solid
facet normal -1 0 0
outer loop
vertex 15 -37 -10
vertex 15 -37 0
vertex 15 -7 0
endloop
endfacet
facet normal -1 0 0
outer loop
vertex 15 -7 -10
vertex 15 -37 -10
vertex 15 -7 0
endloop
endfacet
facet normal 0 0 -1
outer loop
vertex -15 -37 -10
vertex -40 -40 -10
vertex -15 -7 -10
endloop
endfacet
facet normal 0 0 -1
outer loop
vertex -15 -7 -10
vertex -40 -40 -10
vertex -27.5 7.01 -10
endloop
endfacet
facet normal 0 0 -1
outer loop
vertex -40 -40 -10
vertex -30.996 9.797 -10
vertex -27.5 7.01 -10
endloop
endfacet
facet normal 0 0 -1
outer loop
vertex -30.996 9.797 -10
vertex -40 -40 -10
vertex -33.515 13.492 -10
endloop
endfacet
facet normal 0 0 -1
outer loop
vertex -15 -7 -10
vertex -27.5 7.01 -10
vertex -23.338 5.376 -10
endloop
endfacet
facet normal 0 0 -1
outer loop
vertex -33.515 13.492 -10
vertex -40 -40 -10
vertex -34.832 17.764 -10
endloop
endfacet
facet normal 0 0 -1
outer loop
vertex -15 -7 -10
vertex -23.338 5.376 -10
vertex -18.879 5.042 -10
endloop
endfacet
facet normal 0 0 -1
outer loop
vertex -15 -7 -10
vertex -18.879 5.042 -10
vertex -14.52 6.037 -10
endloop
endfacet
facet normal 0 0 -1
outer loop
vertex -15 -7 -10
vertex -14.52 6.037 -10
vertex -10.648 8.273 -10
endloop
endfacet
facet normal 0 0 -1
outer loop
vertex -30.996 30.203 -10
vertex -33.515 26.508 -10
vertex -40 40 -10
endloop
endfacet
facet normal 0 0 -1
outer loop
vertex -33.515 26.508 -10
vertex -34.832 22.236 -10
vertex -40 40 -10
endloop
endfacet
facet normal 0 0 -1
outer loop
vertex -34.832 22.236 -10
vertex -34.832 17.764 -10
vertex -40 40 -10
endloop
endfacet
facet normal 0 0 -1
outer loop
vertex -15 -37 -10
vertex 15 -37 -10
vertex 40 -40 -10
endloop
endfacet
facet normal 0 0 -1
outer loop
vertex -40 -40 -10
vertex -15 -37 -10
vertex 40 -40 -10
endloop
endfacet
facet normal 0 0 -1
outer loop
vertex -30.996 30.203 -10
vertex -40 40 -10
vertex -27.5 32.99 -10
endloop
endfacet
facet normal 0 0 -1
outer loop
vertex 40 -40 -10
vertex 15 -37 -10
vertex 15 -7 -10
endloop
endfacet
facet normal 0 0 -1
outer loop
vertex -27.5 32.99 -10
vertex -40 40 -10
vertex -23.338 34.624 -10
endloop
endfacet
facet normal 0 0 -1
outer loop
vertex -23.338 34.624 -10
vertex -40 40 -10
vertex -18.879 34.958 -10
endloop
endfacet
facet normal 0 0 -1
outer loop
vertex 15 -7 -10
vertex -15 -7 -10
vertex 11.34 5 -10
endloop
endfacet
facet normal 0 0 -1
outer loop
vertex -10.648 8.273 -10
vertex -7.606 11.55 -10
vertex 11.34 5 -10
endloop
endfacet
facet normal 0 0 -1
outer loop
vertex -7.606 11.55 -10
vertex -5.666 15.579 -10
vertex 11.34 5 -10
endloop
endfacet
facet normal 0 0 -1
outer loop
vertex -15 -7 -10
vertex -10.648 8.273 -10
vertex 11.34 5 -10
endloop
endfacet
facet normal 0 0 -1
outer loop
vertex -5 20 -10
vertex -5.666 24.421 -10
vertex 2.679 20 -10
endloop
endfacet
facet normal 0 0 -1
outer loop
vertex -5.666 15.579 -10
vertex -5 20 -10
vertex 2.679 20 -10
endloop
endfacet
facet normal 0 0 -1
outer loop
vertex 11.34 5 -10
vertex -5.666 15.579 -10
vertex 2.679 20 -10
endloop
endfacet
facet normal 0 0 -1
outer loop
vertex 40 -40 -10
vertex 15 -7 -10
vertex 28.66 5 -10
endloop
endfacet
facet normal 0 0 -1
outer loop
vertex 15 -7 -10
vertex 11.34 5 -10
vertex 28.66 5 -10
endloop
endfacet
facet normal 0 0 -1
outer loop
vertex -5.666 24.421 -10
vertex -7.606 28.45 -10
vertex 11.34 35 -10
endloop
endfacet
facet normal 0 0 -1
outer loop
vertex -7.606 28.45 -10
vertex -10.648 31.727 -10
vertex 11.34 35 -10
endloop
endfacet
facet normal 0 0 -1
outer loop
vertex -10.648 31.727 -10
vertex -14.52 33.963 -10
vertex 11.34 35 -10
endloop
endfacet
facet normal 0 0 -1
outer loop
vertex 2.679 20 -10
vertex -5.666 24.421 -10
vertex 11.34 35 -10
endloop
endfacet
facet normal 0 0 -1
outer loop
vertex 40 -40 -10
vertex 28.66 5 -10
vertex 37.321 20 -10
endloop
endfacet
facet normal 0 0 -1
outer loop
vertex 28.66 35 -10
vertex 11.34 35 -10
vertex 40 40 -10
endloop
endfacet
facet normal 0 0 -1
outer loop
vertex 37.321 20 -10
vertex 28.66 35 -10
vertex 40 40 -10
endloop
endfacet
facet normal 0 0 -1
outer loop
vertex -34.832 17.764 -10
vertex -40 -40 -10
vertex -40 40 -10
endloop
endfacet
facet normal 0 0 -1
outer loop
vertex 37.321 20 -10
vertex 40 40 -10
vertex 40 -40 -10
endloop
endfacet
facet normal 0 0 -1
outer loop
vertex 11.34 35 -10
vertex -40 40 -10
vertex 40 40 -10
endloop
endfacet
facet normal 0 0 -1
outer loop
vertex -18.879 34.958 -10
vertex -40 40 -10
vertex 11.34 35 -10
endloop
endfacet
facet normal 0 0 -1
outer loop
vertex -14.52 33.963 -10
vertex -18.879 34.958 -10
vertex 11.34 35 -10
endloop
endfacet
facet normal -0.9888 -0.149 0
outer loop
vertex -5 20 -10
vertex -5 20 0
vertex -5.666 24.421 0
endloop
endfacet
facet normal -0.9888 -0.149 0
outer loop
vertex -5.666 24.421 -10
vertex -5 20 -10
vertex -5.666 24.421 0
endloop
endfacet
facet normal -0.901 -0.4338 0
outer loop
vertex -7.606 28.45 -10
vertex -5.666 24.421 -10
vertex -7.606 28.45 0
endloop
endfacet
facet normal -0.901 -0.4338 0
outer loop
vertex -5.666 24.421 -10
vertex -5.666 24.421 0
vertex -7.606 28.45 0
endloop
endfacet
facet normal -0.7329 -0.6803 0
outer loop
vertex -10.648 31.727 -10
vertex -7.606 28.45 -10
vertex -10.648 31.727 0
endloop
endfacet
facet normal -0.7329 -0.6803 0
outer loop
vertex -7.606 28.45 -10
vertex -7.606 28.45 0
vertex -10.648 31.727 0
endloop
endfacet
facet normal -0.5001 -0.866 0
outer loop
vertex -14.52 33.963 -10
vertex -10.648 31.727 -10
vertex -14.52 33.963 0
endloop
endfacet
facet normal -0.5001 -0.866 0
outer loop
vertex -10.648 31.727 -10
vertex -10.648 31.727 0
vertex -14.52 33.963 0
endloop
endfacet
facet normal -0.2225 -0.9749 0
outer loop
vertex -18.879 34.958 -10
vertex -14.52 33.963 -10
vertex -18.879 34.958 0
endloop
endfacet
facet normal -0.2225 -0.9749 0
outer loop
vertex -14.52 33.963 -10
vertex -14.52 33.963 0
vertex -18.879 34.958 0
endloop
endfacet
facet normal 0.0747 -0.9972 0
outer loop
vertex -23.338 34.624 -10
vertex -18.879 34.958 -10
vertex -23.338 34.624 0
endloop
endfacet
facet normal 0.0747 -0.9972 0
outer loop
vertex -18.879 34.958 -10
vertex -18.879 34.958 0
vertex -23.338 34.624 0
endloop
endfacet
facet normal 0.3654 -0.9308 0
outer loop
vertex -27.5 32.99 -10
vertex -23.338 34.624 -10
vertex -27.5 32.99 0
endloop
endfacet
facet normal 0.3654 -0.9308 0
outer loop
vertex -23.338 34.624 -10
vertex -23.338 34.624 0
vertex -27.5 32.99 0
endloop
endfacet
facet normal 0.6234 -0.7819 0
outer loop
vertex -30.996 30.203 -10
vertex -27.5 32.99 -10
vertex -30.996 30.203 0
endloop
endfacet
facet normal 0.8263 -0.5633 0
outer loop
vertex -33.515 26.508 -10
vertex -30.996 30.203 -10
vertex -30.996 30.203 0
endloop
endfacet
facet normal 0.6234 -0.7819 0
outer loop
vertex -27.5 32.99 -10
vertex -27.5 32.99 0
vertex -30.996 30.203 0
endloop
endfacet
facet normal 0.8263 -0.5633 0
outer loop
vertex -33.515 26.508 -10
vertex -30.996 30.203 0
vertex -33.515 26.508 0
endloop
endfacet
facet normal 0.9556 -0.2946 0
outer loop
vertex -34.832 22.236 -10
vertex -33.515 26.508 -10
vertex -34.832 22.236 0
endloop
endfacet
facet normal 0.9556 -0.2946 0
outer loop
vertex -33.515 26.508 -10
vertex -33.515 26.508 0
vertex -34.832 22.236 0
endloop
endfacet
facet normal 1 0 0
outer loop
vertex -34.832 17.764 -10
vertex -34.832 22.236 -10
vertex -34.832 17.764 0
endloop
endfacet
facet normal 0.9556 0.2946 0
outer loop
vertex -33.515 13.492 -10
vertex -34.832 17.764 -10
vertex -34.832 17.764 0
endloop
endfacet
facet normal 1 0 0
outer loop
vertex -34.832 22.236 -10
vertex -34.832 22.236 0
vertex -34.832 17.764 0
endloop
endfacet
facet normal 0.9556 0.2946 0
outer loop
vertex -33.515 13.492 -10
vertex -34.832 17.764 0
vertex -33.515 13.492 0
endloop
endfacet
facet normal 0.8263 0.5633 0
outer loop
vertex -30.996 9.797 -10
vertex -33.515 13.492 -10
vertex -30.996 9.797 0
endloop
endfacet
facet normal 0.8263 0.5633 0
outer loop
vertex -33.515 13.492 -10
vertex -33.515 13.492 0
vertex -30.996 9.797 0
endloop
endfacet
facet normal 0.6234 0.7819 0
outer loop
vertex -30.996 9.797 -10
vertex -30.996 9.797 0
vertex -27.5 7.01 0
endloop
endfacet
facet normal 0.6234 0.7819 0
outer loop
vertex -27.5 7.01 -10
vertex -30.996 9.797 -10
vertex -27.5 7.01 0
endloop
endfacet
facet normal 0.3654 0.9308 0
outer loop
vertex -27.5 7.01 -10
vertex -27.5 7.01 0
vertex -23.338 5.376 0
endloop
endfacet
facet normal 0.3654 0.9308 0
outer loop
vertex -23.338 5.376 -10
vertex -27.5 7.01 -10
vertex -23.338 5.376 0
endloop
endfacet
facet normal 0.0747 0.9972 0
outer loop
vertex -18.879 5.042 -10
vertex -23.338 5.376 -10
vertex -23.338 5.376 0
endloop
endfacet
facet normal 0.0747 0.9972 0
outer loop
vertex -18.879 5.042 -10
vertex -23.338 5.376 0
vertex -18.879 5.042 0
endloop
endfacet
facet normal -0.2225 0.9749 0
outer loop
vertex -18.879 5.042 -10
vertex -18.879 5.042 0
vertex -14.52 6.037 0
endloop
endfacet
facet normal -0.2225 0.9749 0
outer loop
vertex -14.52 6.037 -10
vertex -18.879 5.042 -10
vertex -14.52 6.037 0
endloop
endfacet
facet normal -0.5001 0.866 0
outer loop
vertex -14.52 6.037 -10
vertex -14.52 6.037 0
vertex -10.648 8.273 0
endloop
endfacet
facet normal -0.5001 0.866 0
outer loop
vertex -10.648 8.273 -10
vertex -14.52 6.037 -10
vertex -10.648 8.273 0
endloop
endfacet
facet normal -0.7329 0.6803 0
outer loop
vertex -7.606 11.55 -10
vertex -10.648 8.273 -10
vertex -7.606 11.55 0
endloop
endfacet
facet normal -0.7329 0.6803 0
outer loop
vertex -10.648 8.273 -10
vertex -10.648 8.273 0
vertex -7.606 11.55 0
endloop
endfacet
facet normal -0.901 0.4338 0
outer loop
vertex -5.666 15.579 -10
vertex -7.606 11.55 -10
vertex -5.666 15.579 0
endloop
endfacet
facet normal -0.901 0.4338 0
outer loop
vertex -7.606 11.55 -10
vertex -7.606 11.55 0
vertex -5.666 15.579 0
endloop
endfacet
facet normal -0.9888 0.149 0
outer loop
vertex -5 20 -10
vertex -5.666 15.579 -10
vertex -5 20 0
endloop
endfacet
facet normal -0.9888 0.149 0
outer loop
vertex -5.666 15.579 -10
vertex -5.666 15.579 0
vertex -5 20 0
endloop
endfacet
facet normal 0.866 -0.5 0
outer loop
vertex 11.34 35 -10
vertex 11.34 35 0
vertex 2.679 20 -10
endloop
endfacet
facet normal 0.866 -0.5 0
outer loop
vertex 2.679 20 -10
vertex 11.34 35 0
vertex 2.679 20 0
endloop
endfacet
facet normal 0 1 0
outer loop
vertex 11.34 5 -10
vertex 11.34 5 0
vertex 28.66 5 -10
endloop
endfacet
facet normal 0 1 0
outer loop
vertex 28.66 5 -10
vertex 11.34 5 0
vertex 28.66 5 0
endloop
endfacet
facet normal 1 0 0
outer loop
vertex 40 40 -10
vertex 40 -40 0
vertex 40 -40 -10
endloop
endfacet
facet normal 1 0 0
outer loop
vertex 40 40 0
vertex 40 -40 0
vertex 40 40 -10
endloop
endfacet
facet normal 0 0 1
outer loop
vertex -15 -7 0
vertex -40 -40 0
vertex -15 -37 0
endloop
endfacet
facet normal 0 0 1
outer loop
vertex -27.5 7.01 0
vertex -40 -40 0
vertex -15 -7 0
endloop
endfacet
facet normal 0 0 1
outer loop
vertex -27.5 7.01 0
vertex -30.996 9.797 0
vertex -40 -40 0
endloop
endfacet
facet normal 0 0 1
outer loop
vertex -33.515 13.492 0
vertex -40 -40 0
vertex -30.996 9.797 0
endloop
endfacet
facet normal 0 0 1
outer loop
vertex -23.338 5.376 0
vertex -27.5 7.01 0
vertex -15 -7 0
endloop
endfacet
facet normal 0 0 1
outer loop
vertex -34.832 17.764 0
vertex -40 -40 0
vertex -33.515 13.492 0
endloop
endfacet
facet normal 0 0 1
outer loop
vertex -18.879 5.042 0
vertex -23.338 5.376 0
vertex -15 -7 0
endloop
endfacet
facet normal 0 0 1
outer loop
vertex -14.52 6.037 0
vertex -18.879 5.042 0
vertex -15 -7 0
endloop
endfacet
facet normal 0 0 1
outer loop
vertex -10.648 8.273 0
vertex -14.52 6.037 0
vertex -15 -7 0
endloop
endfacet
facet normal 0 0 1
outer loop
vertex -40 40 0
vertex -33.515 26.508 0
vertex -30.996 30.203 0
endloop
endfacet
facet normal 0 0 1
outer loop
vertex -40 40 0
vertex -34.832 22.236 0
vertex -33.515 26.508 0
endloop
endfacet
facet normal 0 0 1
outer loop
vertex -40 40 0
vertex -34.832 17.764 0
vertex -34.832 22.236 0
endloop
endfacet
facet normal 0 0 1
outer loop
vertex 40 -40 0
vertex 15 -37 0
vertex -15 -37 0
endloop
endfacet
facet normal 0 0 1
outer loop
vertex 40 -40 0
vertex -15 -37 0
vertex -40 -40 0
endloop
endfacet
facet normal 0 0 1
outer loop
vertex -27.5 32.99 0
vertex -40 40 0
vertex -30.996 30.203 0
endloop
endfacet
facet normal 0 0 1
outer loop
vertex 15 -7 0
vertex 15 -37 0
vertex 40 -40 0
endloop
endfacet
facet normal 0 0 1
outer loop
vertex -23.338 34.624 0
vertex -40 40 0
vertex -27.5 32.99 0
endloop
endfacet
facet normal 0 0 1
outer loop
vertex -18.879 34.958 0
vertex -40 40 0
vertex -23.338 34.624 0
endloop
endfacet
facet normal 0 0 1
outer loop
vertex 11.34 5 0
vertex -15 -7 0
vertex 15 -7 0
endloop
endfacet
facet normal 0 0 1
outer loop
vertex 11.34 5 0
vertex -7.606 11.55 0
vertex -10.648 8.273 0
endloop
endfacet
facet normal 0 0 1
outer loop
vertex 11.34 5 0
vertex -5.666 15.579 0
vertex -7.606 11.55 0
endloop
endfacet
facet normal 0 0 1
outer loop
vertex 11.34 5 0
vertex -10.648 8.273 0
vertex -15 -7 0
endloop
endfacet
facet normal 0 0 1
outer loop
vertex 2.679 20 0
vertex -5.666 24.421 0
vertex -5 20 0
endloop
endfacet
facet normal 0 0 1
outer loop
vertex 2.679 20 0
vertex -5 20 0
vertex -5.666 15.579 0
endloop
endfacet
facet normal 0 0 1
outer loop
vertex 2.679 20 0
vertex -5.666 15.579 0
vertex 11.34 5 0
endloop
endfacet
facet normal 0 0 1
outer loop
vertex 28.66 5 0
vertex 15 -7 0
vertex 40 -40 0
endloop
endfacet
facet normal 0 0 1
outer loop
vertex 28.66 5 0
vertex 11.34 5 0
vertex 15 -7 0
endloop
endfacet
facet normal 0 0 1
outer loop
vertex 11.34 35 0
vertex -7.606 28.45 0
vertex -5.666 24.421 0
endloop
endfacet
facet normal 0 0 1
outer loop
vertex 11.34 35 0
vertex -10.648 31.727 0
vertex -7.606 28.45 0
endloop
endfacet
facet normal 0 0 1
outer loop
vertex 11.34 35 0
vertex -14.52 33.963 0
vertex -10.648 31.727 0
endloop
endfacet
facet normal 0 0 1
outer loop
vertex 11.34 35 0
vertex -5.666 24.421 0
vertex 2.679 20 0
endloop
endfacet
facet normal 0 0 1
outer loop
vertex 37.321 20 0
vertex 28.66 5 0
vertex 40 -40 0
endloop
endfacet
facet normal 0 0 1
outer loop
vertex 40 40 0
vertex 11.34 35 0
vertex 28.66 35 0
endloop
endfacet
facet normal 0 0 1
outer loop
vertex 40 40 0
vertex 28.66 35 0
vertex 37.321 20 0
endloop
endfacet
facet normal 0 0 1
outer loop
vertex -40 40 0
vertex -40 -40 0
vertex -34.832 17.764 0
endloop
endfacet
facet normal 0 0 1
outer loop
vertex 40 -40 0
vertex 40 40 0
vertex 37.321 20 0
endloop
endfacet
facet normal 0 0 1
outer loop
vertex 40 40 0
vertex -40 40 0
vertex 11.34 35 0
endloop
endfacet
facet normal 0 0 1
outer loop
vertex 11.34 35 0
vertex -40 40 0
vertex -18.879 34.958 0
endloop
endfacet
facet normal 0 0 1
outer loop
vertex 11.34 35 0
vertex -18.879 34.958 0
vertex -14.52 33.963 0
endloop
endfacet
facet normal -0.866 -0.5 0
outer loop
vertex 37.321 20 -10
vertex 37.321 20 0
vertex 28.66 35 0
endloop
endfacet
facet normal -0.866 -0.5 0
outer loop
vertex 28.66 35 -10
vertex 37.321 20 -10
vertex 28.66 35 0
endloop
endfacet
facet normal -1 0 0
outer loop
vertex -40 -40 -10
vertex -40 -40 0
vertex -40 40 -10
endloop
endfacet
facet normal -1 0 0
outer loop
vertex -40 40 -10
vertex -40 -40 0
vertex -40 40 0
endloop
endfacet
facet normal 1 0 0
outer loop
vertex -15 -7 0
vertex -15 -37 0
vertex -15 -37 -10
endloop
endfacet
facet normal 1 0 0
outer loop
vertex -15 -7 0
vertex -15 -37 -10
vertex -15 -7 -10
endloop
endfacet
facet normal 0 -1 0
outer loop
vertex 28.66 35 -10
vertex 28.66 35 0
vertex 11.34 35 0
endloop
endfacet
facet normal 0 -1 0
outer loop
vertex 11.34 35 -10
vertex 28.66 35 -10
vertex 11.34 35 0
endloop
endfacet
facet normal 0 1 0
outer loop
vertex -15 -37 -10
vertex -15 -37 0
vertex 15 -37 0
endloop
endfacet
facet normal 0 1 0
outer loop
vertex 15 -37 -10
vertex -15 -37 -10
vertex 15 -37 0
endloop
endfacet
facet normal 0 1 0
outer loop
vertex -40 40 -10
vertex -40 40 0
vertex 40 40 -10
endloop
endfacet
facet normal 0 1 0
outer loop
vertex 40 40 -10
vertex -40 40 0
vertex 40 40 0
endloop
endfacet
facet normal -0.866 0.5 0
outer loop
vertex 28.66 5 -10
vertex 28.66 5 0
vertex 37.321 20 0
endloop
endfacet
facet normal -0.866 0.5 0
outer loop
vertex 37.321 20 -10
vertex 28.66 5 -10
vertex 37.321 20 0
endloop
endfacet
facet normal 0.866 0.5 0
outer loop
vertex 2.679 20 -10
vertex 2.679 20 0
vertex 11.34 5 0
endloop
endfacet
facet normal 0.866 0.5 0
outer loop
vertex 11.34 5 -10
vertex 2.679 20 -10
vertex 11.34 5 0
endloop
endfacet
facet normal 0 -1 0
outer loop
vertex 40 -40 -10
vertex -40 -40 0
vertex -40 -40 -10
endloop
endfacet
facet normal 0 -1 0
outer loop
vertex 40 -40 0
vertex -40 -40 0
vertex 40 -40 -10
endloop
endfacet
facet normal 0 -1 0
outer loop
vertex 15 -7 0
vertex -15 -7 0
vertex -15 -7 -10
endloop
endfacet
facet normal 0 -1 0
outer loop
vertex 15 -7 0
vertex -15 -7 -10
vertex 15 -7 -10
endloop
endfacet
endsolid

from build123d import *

# Parameters (mm, degrees)
SKETCH1_W           = 80
SKETCH1_H           = 80
SKETCH1_R           = 15
SKETCH1_W_2         = 30
SKETCH1_H_2         = 30
BOSS_EXTRUDE1_DEPTH = 10


with BuildPart() as part:
    # Sketch1 → Boss-Extrude1 (new body)
    with BuildSketch(Plane.XY):
        Rectangle(SKETCH1_W, SKETCH1_H)
        with Locations((-20, 20)):
            Circle(SKETCH1_R, mode=Mode.SUBTRACT)
        Polygon((11.339745962, 35), (2.679491924, 20), (11.339745962, 5), (28.660254038, 5), (37.320508076, 20), (28.660254038, 35), align=None, mode=Mode.SUBTRACT)
        with Locations((0, -22)):
            Rectangle(SKETCH1_W_2, SKETCH1_H_2, mode=Mode.SUBTRACT)
    extrude(amount=-BOSS_EXTRUDE1_DEPTH)


solid = part.part
